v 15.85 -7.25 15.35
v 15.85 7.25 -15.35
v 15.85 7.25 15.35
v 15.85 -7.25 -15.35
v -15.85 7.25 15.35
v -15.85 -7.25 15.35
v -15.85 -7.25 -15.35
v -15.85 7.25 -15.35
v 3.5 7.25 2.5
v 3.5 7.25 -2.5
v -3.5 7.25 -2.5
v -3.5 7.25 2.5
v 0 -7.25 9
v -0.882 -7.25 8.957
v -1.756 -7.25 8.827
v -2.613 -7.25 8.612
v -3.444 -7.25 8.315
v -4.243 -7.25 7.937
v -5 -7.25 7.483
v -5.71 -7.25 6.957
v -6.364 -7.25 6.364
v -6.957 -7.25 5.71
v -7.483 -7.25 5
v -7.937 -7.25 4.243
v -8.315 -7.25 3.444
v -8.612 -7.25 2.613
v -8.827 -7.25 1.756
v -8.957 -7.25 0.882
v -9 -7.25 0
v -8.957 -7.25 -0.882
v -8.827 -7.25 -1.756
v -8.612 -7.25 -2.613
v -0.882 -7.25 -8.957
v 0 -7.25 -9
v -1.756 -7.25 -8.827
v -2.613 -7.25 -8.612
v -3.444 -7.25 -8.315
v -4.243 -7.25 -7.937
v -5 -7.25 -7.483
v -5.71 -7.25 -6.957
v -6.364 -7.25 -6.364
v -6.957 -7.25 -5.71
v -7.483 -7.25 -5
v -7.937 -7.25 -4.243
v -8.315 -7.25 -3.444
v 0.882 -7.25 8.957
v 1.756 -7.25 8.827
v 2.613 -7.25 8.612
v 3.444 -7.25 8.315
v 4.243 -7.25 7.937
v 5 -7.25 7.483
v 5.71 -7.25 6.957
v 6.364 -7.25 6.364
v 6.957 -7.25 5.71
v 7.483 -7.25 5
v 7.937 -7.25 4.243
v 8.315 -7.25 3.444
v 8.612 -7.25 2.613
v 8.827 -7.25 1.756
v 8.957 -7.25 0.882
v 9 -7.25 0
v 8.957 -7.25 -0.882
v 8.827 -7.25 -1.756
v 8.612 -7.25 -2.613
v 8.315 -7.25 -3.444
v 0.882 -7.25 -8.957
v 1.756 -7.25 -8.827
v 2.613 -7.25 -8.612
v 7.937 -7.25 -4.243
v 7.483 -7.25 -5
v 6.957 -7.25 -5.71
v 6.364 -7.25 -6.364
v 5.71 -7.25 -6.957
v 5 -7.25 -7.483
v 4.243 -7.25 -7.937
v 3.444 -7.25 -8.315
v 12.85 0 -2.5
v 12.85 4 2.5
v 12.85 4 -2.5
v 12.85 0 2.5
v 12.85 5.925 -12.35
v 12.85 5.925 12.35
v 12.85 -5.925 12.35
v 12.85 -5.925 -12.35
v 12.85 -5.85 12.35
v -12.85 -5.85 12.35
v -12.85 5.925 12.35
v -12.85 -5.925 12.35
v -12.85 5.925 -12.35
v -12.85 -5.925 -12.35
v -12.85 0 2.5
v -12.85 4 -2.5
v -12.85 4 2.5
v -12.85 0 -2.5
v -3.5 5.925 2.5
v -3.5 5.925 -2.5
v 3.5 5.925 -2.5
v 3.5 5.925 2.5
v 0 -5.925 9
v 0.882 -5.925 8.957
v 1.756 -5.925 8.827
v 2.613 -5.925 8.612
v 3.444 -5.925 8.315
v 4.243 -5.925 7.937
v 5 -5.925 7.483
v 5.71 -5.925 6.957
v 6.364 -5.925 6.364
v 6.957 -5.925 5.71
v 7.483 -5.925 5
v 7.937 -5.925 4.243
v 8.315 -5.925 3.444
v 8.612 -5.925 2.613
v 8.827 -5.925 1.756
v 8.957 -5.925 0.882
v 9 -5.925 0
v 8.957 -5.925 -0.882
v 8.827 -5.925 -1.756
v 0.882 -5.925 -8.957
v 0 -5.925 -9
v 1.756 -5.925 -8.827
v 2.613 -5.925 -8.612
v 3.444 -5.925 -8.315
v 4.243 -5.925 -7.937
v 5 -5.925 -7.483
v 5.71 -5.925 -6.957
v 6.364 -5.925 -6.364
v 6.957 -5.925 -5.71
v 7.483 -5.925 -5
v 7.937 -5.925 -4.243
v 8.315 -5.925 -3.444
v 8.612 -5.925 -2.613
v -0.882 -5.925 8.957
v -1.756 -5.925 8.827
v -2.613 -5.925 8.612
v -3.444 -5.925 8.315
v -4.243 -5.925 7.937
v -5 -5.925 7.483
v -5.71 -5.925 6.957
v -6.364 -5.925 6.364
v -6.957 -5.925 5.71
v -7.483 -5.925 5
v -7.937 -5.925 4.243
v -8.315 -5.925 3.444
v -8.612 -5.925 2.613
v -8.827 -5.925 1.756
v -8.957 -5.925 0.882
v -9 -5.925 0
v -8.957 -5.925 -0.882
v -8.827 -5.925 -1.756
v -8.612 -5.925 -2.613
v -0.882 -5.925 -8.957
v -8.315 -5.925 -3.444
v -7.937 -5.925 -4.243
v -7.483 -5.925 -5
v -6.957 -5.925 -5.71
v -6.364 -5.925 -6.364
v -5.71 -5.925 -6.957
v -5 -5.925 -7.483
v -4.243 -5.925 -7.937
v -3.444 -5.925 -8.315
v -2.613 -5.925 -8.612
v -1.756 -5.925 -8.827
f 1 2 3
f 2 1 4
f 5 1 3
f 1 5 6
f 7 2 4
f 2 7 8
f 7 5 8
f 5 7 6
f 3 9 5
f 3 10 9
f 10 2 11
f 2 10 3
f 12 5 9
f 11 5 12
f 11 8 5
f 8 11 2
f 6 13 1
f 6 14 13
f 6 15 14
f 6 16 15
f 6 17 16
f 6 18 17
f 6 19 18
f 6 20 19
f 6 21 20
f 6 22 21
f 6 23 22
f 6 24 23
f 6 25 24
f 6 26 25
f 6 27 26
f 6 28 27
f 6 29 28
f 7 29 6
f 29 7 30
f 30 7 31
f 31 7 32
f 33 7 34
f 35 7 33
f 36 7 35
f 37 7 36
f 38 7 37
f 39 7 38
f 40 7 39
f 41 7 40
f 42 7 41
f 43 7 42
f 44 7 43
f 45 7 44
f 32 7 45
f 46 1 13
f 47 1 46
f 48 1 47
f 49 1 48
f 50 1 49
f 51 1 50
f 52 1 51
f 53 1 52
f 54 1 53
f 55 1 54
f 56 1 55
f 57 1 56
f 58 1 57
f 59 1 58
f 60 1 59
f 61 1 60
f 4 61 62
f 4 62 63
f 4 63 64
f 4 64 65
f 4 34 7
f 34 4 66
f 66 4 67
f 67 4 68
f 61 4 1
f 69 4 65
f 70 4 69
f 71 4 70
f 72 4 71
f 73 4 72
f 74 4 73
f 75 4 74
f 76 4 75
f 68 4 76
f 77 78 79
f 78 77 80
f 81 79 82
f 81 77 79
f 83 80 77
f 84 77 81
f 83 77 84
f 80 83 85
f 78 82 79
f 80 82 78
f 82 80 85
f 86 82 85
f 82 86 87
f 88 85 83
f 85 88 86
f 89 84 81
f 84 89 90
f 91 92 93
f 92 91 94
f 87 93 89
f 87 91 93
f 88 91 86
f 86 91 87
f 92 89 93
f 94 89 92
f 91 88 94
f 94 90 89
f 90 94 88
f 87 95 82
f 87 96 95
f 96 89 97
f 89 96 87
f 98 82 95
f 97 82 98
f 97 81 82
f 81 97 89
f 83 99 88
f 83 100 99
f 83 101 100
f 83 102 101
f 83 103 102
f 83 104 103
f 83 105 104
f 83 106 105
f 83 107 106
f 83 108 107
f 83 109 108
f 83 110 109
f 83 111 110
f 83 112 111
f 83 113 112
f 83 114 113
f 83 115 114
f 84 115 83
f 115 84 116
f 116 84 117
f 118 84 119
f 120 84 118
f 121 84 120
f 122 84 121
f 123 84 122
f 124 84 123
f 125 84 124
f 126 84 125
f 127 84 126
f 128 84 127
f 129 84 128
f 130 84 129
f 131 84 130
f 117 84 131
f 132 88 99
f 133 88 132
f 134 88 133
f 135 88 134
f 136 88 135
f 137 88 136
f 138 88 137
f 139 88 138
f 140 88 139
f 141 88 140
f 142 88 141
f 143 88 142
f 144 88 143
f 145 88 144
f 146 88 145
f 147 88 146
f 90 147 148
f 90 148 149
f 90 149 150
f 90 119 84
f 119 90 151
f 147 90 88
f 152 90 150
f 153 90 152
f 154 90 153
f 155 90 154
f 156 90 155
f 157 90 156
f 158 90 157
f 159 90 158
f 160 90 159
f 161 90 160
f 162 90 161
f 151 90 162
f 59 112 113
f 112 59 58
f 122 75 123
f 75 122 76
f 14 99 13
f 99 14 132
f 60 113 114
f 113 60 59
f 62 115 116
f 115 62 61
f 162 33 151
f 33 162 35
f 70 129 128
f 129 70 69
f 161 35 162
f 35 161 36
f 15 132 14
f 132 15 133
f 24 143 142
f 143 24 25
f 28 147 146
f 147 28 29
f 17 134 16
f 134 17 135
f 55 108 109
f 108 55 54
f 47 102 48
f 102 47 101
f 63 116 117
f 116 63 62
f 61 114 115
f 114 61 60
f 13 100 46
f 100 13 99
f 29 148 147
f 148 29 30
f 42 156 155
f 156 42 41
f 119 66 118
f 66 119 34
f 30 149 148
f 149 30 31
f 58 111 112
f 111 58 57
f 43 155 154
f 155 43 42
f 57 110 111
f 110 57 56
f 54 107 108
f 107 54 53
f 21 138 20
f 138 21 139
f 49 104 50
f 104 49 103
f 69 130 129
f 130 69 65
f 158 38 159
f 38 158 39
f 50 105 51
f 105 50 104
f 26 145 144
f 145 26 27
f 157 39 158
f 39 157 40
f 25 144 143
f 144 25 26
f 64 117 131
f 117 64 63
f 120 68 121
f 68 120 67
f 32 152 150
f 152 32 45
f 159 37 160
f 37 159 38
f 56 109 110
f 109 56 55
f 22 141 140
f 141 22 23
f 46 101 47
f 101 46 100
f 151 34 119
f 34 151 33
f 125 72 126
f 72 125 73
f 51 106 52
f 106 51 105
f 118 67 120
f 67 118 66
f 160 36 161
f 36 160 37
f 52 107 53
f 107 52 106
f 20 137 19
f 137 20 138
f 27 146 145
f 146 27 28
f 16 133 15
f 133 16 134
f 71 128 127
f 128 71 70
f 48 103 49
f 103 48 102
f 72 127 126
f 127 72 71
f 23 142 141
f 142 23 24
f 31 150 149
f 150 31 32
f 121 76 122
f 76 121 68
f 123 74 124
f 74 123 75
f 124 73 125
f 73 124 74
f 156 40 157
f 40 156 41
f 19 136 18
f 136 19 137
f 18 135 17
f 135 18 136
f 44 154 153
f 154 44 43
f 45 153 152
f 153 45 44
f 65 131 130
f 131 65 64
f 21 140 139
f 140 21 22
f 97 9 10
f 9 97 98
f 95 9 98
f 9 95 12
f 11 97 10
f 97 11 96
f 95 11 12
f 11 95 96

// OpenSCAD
// DRACO serviceable sensor insert — positive retention revision
// Physical hardware is the dimensional authority. Values below are placeholders
// until the installed camera/sensor is measured per BUILD_HANDOFF.md.
sensor_x = 25;
sensor_y = 24;
sensor_z = 11.5;
fit_clearance = 0.35;
frame=3;
insert_x=sensor_x+2*frame+2*fit_clearance;
insert_y=sensor_y+2*frame+2*fit_clearance;
insert_z=sensor_z+frame;
lens_d=18;
lip=1.4;
tab_w=5;
tab_t=1.6;
tab_h=4;
cable_w=7;
cable_h=5;

module retention_tabs(){
    // Flexible side tabs prevent the module from backing out of the insert.
    for(s=[-1,1])
        translate([s*(sensor_x/2+fit_clearance+tab_t/2),2,0])
            cube([tab_t,tab_h,tab_w],center=true);
}
module camera_insert(){
    // RELEASE GATE: do not treat this insert as production-ready until
    // sensor body, lens projection, connector position and cable exit are measured.
    difference(){
        cube([insert_x,insert_z,insert_y],center=true);
        // Sensor body pocket.
        cube([sensor_x+2*fit_clearance,sensor_z+fit_clearance,sensor_y+2*fit_clearance],center=true);
        // Protected optical opening.
        translate([0,-insert_z/2,0]) rotate([90,0,0])
            cylinder(d=lens_d,h=frame*4,center=true,$fn=64);
        // Rear cable exit aligned to the shell/cartridge harness lane.
        translate([0,insert_z/2,0])
            cube([cable_w,frame*4,cable_h],center=true);
    }
    // Front stop lip keeps the board from moving toward the aperture.
    translate([0,-insert_z/2+lip/2,insert_y/2-frame/2])
        cube([sensor_x+2,lip,frame],center=true);
    retention_tabs();
}
camera_insert();
